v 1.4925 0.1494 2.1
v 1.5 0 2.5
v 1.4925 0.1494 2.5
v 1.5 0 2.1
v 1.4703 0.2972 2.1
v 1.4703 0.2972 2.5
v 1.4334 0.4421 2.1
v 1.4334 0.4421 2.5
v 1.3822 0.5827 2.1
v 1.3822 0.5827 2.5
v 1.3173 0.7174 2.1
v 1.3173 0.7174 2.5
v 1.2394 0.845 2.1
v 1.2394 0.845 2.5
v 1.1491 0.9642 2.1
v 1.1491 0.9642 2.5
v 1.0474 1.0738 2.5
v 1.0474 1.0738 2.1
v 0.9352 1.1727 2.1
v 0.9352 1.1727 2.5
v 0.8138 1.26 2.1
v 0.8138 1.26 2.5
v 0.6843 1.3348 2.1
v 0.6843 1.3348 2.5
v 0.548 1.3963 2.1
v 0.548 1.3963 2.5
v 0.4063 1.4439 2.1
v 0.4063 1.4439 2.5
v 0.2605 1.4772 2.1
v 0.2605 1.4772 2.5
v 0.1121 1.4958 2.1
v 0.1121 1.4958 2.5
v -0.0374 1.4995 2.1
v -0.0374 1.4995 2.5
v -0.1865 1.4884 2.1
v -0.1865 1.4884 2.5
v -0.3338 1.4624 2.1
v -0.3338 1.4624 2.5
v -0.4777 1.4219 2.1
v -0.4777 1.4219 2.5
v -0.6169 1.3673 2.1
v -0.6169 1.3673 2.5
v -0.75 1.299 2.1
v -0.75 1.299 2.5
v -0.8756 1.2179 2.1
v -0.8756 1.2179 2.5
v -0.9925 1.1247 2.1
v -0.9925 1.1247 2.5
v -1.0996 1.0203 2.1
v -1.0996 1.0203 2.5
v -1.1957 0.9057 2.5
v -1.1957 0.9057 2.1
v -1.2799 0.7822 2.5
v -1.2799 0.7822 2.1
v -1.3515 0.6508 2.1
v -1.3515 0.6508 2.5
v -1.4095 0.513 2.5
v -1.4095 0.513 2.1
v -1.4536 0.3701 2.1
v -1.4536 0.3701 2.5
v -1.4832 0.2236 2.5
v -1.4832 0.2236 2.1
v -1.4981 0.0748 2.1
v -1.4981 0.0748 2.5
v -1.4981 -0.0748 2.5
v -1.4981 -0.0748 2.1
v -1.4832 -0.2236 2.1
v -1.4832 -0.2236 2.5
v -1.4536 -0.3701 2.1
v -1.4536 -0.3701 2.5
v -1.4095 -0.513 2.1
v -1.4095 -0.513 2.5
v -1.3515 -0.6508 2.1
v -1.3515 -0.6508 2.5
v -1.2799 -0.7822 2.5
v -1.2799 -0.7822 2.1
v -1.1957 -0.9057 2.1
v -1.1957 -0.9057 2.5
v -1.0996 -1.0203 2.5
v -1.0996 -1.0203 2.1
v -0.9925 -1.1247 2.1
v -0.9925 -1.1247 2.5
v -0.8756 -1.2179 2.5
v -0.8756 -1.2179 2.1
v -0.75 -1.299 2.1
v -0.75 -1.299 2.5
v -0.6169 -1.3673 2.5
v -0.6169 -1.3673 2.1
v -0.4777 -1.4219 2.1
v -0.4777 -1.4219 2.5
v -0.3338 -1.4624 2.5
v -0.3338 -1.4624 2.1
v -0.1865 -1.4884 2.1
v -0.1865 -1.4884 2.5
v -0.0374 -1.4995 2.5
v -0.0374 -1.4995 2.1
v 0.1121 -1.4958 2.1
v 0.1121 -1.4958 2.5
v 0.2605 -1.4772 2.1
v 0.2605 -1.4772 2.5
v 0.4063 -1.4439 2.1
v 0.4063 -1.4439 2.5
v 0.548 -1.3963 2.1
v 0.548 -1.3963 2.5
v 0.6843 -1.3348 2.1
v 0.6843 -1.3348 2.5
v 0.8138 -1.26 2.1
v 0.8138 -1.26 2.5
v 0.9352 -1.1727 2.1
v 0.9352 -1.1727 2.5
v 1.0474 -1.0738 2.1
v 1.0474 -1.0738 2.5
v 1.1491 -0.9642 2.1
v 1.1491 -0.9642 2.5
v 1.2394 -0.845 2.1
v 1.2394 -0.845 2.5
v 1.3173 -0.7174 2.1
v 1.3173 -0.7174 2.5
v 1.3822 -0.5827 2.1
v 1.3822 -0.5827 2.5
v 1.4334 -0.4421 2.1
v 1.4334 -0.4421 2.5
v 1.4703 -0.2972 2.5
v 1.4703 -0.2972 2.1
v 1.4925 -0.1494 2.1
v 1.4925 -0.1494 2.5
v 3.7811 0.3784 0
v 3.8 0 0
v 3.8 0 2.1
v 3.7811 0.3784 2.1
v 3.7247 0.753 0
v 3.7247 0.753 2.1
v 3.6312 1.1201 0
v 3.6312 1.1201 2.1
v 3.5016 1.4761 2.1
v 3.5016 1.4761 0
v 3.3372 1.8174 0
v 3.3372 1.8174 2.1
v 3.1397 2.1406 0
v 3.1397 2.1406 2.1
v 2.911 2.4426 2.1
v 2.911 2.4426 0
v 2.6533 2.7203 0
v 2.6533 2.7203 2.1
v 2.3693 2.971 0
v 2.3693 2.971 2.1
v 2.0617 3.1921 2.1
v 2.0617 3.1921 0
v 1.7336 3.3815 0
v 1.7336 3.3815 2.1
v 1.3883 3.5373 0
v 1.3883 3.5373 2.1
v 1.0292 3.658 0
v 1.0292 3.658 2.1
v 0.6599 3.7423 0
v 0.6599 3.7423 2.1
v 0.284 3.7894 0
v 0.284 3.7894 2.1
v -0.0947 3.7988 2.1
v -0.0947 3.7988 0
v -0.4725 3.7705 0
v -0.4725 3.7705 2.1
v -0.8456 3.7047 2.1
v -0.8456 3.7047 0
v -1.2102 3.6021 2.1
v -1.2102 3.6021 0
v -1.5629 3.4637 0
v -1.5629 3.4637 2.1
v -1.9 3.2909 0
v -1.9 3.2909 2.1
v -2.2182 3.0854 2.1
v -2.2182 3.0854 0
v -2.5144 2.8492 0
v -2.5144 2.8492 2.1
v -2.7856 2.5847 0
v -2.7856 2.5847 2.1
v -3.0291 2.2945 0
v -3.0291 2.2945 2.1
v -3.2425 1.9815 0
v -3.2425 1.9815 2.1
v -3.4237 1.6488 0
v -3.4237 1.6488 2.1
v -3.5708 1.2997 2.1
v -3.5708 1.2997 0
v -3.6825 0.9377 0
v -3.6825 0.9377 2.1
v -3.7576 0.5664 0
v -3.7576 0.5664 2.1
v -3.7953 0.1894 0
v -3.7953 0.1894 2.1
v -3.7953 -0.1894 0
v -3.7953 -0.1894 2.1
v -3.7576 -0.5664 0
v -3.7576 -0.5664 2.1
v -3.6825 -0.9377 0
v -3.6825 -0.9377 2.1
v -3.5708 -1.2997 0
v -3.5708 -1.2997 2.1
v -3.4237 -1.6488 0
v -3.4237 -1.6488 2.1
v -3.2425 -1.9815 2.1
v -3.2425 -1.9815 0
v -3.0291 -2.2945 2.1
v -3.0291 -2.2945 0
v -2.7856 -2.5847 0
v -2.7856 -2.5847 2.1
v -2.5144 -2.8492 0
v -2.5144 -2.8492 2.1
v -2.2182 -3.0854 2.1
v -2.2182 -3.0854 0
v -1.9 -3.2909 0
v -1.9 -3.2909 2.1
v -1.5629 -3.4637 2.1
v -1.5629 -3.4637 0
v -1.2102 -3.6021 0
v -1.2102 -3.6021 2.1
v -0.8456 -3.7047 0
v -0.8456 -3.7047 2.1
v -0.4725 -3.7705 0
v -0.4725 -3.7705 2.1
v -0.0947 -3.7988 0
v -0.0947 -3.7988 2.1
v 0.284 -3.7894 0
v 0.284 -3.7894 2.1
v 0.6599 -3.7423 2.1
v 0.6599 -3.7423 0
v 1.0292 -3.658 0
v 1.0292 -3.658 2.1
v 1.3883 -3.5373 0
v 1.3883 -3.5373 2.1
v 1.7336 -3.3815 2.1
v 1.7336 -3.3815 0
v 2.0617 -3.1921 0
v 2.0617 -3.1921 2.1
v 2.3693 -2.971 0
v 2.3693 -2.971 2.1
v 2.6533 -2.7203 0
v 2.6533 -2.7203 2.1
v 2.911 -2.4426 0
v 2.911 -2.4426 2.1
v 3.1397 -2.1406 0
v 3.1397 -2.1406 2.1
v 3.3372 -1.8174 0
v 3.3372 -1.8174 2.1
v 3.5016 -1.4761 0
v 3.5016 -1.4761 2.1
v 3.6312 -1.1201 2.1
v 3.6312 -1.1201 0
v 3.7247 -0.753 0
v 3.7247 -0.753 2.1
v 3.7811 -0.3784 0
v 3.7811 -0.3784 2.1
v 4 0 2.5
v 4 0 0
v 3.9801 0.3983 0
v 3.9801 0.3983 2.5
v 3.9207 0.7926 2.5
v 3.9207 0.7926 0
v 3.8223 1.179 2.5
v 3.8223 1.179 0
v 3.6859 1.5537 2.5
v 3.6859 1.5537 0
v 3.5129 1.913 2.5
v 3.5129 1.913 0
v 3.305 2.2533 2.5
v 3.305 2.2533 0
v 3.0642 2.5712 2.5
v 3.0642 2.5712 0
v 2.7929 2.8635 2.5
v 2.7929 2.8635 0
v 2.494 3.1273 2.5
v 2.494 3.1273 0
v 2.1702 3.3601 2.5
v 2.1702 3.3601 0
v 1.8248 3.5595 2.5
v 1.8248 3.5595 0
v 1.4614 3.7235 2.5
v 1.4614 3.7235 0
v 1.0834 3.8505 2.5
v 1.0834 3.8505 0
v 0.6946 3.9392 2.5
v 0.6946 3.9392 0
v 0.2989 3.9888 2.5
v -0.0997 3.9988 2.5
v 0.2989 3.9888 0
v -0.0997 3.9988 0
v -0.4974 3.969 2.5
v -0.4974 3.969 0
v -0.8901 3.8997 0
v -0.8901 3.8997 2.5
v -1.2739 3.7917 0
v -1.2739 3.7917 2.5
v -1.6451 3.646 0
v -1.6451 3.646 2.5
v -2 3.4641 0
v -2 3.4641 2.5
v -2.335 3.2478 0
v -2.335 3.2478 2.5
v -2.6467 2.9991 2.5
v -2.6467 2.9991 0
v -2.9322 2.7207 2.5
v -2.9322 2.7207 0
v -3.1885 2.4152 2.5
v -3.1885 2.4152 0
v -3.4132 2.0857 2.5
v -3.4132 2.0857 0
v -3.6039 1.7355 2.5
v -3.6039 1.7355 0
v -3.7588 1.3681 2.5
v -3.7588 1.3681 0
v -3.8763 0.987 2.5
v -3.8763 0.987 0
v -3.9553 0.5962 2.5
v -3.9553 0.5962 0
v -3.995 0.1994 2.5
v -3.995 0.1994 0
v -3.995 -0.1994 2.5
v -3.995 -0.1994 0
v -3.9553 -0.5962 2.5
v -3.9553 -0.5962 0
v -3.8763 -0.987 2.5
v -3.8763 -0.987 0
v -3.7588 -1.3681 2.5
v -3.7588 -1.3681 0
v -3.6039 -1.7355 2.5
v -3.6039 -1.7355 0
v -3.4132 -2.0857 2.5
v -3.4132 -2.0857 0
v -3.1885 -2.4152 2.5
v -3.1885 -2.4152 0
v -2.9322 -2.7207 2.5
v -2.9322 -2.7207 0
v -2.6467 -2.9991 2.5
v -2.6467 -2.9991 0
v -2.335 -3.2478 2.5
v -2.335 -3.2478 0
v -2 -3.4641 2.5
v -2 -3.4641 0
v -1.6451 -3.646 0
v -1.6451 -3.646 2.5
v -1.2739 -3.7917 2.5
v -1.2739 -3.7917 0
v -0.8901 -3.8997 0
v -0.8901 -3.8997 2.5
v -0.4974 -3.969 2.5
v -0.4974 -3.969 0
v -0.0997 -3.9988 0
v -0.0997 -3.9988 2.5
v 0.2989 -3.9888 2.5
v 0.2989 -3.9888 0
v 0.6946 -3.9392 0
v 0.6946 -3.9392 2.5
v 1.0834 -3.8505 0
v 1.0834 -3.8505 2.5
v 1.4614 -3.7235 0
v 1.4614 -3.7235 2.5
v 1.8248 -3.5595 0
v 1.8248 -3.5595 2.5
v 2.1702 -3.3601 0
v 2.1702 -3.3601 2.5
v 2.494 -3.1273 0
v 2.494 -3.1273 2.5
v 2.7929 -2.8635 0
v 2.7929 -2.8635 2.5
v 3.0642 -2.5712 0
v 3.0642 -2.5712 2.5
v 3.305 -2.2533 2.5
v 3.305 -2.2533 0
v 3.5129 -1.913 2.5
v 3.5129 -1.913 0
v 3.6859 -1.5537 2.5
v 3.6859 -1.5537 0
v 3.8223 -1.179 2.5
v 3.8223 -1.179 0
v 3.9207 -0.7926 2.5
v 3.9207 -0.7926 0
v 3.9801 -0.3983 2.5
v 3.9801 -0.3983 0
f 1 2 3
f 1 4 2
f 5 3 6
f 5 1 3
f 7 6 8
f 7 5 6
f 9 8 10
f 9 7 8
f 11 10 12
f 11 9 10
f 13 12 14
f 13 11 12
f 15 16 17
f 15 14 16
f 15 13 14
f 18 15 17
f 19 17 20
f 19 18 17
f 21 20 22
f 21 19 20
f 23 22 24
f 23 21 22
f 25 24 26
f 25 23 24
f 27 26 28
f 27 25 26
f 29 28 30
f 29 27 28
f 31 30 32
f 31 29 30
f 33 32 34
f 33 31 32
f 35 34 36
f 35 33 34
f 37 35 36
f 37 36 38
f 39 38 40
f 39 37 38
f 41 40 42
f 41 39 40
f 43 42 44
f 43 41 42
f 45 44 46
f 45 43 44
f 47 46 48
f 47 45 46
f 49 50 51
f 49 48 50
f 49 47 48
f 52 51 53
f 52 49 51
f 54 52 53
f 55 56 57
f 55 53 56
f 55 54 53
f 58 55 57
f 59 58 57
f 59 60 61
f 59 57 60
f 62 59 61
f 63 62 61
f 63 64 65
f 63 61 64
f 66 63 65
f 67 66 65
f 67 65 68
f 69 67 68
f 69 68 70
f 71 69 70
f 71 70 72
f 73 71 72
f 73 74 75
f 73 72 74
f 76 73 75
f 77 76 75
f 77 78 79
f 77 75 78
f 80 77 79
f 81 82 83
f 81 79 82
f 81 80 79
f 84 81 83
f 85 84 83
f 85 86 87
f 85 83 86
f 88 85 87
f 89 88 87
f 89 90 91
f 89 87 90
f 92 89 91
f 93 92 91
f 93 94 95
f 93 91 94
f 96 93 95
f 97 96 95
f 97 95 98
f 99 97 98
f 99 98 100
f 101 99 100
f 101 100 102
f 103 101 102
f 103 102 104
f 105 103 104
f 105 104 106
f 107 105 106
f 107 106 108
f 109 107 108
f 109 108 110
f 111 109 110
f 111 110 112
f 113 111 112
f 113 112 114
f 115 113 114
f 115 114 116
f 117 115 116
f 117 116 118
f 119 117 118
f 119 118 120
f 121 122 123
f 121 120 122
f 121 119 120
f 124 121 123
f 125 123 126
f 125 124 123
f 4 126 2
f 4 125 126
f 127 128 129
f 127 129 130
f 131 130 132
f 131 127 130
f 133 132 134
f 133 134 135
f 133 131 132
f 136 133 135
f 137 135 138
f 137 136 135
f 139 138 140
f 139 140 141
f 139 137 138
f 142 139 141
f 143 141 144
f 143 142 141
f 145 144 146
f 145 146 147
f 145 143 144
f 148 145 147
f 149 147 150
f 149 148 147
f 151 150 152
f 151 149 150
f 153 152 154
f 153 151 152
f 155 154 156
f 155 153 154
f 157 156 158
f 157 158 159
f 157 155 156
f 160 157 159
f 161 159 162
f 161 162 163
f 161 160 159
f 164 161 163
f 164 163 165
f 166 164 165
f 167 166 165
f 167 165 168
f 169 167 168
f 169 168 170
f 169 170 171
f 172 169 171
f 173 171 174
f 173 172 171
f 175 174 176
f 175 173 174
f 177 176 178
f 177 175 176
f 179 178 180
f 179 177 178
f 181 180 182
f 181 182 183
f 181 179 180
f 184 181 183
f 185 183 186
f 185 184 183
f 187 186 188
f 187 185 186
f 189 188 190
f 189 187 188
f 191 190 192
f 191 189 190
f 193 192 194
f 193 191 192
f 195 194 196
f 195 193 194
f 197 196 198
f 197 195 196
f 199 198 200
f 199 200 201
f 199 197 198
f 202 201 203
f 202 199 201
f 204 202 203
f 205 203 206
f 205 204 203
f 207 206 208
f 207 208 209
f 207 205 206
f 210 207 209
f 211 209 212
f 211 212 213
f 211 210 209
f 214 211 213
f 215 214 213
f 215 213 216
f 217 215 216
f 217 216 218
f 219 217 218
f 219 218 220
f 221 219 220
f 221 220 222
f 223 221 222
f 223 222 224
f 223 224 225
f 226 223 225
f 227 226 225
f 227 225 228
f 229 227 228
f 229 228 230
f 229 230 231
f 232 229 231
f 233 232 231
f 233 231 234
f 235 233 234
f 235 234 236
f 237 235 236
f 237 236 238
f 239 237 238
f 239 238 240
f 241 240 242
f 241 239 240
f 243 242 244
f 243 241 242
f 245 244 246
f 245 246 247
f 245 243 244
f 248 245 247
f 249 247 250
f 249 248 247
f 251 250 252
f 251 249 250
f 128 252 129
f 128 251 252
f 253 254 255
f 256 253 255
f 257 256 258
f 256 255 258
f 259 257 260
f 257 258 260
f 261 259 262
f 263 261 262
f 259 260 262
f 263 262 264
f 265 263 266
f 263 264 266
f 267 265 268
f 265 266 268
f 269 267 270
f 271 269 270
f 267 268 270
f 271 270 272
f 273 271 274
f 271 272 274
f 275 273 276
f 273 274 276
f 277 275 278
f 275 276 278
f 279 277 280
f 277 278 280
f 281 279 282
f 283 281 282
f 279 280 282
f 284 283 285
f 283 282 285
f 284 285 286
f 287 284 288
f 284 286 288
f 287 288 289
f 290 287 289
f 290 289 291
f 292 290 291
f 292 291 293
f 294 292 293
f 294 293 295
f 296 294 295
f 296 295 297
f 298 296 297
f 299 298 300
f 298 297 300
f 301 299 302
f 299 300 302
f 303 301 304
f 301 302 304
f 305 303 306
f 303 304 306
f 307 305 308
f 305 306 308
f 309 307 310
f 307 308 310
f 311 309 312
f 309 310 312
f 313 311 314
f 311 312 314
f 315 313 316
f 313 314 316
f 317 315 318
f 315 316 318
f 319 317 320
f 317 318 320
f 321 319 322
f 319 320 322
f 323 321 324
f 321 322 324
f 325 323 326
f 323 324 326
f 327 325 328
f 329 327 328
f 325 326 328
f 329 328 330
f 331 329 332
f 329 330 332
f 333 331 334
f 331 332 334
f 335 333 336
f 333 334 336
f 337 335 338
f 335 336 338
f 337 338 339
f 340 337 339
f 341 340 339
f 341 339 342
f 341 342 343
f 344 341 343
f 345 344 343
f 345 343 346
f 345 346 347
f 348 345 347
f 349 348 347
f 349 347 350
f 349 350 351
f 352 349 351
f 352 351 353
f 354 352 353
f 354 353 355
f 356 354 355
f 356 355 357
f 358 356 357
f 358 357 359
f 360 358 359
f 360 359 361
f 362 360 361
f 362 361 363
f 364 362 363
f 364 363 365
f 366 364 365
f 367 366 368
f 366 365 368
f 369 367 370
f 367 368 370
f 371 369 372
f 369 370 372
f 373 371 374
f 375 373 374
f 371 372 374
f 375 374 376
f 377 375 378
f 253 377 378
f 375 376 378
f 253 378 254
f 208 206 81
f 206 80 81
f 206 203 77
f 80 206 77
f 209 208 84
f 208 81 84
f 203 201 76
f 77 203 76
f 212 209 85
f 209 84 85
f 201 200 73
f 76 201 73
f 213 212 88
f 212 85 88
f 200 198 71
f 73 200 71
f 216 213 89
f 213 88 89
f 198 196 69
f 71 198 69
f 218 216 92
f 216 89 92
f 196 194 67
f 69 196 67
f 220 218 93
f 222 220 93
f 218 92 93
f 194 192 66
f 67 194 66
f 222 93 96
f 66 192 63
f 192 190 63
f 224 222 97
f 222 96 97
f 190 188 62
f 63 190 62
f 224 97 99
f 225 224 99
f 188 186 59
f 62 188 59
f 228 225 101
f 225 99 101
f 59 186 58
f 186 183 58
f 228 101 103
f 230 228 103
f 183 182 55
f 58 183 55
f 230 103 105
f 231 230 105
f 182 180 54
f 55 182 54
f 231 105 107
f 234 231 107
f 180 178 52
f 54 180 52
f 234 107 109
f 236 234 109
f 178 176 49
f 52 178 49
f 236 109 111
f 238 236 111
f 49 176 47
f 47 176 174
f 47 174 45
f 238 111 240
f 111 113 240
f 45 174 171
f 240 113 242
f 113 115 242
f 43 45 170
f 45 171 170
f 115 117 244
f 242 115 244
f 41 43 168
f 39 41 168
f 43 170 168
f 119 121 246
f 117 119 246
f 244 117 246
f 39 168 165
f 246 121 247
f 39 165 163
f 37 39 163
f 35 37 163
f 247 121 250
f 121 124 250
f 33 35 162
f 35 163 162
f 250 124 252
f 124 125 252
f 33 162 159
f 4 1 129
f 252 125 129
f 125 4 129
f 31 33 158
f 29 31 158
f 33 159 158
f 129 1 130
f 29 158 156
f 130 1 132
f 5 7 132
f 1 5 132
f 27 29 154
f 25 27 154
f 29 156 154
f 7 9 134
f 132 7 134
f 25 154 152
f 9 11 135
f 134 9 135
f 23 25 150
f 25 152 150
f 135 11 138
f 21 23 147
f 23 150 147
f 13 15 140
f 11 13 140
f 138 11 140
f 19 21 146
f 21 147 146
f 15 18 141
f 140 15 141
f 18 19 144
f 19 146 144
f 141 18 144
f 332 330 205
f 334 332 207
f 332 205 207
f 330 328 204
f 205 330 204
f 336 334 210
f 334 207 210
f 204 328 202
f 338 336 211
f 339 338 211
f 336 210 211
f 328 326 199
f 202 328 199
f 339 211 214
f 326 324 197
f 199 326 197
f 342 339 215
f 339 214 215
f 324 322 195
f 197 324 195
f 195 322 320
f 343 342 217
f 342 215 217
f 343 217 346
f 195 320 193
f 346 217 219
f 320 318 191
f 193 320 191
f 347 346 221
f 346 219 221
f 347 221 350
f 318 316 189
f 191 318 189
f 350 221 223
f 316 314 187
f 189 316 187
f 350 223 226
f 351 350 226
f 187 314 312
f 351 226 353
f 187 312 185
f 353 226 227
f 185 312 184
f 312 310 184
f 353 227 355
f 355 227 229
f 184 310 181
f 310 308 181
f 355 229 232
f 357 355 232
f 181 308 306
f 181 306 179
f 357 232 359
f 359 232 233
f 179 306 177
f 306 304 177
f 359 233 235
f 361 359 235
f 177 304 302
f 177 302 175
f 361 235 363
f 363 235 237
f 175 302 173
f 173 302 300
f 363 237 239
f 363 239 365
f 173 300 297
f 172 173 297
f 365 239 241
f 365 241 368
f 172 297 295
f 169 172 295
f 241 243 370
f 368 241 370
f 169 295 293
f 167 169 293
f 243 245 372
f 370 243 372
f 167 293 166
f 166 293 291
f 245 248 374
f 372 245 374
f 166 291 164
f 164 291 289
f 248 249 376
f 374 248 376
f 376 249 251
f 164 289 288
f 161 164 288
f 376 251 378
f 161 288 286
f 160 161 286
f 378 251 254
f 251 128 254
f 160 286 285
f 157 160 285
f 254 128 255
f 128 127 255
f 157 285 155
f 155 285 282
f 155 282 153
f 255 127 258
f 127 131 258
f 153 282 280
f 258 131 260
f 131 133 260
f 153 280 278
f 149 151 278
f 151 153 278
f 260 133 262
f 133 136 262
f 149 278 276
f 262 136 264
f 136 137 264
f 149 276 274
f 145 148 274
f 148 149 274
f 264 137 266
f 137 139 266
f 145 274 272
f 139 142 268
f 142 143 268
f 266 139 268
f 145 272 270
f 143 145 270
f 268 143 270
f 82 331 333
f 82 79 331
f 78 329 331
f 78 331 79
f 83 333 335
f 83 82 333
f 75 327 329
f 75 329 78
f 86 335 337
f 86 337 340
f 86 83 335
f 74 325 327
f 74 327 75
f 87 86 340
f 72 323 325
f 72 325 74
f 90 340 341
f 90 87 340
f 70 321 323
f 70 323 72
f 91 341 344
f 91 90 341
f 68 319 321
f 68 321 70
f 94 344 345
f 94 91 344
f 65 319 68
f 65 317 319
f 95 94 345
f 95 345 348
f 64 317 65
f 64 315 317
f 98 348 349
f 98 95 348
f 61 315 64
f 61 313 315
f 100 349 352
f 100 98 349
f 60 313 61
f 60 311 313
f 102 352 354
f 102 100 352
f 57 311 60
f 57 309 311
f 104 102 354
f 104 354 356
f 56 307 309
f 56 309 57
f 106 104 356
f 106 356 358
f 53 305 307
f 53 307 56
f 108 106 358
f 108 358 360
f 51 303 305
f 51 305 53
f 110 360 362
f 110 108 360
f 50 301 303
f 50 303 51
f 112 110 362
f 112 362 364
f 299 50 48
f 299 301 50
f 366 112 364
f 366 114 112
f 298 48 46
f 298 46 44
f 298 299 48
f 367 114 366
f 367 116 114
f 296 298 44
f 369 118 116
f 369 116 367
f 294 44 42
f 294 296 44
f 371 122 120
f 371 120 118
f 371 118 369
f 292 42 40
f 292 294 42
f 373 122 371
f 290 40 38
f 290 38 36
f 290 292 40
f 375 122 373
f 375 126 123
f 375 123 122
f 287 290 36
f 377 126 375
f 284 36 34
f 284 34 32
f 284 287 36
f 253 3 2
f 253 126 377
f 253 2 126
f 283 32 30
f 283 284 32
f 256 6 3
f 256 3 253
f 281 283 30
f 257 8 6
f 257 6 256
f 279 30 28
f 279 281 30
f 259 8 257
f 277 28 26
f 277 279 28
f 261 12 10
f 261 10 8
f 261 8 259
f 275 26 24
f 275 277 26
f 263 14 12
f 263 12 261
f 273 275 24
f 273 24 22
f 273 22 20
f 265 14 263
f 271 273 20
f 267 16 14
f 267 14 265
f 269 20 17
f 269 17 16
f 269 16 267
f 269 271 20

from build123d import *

# Parameters (mm, degrees)
CYLINDER004_R     = 1.5
CYLINDER004_DEPTH = 3
CYLINDER003_R     = 3.8
CYLINDER003_DEPTH = 2.1
CYLINDER002_R     = 4
CYLINDER002_DEPTH = 2.5


with BuildPart() as cylinder004:
    # Cylinder004 → Cylinder004 (new body)
    with BuildSketch(Plane.XY):
        Circle(CYLINDER004_R)
    extrude(amount=CYLINDER004_DEPTH)


with BuildPart() as fusion:
    # Cylinder003 → Cylinder003 (new body)
    with BuildSketch(Plane.XY):
        Circle(CYLINDER003_R)
    extrude(amount=CYLINDER003_DEPTH)

    # Fusion: union Cylinder004
    add(cylinder004.part)


with BuildPart() as cut001:
    # Cylinder002 → Cylinder002 (new body)
    with BuildSketch(Plane.XY):
        Circle(CYLINDER002_R)
    extrude(amount=CYLINDER002_DEPTH)

    # Cut001: cut Fusion
    add(fusion.part, mode=Mode.SUBTRACT)


solid = cut001.part
